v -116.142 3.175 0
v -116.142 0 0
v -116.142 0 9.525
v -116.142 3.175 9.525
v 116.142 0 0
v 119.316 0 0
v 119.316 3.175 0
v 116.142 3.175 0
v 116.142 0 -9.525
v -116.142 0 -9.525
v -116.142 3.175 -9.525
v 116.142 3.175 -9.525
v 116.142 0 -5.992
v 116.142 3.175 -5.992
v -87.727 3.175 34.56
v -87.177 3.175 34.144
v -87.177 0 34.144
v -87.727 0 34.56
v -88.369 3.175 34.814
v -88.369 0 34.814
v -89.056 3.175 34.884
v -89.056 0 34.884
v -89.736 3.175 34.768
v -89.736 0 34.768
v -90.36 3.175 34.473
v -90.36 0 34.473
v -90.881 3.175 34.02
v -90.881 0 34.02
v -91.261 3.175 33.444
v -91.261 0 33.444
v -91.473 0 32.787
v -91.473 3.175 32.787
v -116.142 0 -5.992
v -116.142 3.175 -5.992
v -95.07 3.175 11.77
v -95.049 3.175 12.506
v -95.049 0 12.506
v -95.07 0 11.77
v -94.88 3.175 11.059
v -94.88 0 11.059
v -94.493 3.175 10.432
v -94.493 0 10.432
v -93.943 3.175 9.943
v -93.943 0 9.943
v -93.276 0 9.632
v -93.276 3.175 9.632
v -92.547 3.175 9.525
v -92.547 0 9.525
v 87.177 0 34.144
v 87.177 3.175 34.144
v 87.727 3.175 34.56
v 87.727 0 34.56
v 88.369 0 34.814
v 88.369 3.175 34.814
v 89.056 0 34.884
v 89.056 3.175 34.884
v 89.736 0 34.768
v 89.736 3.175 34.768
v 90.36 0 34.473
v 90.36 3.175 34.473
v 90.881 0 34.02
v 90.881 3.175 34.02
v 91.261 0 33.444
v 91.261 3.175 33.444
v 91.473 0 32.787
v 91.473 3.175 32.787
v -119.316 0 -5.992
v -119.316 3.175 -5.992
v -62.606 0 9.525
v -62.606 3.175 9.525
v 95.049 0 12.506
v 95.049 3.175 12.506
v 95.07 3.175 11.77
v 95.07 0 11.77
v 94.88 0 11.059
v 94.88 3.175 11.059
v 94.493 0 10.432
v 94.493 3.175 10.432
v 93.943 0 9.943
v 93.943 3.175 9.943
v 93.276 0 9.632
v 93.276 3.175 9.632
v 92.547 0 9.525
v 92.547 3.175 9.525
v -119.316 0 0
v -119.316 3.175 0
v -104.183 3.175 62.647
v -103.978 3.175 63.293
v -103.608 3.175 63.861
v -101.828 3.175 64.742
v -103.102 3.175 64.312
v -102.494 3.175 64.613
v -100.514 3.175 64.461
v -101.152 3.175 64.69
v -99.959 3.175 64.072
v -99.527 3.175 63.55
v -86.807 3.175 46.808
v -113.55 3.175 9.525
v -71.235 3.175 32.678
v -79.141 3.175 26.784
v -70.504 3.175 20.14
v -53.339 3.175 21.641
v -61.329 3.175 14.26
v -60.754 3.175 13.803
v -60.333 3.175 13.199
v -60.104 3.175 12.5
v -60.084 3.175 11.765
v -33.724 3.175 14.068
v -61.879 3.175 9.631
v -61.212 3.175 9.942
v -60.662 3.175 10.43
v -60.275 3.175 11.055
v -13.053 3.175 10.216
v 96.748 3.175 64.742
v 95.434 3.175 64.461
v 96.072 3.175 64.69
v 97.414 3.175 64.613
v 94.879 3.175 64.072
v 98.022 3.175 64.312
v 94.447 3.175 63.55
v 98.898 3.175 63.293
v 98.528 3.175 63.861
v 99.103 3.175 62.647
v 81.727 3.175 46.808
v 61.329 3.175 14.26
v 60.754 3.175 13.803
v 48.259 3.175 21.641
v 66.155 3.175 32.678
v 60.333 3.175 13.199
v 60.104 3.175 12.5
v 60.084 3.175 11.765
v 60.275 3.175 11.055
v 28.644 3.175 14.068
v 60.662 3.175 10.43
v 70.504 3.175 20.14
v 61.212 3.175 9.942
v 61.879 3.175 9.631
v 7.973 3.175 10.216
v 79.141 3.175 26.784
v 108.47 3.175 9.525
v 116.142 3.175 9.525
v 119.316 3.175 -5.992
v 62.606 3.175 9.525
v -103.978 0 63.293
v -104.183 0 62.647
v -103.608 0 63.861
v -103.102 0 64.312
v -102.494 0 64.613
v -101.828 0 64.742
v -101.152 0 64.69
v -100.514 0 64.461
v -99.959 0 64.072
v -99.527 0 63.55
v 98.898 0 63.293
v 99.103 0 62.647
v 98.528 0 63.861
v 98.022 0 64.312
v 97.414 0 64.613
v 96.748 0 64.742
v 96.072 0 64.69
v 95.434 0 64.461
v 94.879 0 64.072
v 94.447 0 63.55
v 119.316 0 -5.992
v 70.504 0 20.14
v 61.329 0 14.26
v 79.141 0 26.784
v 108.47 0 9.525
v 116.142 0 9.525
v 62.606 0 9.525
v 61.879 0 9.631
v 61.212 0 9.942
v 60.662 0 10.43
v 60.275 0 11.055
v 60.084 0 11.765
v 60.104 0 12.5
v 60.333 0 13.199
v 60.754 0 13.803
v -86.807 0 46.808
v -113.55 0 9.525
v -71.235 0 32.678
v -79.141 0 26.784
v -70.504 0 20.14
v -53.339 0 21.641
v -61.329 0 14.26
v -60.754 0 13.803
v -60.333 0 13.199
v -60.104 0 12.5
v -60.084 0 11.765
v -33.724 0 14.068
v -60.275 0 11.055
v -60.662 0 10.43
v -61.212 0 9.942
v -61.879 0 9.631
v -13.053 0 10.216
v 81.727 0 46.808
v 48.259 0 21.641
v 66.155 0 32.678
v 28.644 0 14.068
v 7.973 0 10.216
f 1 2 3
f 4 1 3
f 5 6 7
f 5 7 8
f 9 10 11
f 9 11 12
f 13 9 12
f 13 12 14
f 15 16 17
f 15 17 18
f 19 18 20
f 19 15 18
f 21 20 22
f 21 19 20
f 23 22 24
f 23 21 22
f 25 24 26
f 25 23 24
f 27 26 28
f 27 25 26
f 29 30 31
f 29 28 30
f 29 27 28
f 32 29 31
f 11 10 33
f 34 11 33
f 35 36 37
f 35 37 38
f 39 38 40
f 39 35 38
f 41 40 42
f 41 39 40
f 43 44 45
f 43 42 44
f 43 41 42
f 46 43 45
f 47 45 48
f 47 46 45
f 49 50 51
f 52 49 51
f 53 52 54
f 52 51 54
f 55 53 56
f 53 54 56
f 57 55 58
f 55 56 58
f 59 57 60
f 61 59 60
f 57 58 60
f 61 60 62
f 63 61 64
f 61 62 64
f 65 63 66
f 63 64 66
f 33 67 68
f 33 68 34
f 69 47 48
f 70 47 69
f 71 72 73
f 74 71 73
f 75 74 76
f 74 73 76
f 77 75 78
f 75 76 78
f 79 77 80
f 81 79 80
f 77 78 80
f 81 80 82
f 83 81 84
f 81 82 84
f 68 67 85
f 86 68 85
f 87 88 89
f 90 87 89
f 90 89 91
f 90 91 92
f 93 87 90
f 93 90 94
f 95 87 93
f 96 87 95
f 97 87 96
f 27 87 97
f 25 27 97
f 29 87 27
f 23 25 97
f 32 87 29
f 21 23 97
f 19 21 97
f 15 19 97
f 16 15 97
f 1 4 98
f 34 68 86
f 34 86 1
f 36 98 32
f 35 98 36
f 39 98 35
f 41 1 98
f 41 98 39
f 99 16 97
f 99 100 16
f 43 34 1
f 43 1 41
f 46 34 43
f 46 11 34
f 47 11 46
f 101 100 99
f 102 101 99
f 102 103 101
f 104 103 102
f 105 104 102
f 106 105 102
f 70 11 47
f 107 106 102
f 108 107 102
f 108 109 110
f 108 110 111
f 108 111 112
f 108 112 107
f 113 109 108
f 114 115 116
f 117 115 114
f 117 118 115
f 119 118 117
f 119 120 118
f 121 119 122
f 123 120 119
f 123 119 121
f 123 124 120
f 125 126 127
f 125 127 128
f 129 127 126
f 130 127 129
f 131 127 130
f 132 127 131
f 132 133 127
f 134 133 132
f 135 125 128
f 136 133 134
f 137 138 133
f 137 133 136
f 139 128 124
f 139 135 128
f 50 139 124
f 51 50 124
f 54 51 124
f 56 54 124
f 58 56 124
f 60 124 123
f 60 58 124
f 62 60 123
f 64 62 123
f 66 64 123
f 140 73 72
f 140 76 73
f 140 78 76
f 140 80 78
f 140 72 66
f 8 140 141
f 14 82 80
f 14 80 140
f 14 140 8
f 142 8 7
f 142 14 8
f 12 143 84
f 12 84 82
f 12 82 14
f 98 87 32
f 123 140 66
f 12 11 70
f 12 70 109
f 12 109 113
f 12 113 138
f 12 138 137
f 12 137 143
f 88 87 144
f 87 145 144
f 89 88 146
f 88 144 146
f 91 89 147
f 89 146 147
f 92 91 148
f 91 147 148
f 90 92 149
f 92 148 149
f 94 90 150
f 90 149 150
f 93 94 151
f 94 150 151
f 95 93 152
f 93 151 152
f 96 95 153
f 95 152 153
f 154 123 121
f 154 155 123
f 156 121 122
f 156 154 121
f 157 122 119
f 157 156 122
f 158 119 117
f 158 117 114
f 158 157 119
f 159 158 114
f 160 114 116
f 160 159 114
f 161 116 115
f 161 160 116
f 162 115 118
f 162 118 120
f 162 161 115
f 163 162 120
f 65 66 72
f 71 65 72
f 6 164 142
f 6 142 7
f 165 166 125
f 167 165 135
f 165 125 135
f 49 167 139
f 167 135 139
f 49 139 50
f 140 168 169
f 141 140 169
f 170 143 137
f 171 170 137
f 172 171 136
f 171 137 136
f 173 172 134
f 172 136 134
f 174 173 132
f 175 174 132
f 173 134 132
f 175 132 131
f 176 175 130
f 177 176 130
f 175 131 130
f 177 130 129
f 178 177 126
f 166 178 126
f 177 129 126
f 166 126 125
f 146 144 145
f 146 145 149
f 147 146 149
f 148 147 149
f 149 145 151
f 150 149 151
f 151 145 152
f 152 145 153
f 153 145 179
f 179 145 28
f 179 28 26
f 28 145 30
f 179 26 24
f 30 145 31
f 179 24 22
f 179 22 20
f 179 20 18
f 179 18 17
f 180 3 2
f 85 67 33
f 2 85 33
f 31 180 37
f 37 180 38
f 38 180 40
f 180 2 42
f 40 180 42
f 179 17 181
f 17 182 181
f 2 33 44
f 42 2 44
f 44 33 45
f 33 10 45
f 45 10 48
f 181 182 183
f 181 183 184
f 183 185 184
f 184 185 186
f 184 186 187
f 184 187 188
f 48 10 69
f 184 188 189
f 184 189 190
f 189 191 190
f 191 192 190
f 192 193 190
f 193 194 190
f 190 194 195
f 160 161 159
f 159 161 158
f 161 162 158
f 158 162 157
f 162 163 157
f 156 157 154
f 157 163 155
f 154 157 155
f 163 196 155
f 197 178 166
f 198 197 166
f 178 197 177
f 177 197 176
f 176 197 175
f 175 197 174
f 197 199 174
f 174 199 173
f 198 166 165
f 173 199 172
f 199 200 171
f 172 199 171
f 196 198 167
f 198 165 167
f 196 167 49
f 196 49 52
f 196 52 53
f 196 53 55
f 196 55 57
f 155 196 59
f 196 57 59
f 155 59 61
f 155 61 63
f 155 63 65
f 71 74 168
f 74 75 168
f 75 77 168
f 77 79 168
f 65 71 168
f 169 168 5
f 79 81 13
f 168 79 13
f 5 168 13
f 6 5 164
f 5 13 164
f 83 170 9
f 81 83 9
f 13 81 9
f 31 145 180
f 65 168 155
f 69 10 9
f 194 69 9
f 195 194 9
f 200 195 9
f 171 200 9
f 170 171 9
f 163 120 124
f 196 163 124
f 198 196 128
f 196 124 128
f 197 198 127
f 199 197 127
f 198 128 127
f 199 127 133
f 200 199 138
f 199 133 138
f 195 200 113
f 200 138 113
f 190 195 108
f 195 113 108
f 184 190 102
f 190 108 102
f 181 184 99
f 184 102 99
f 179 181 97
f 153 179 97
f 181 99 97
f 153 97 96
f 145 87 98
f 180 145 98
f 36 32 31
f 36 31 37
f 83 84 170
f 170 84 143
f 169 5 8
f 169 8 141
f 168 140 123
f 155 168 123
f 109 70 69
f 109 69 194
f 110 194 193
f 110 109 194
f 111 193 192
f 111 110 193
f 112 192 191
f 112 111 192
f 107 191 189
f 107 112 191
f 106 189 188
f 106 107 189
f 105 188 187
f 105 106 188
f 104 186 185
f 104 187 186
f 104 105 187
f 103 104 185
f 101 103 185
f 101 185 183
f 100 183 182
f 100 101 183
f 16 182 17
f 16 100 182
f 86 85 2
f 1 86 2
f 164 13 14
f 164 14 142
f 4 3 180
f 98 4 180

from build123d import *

# Parameters (mm, degrees)
SKETCH1_W               = 666.75
SKETCH1_H               = 19.05
BOSS_EXTRUDE1_DEPTH     = 3.175
SKETCH2_W               = 3.175
SKETCH2_H               = 9.525
CUT_EXTRUDE2_DEPTH      = 334.526156208
TOP_BALL_SECURING_DEPTH = 3.175
FILLET2_R               = 2.54
CUT_EXTRUDE3_DEPTH      = 340.618903378
CUT_EXTRUDE8_REACH      = 341.619
SKETCH12_W              = 214.0585
SKETCH12_H              = 19.05
CUT_EXTRUDE9_REACH      = 137.789
SKETCH13_W              = 3.175
SKETCH13_H              = 3.53251897


with BuildPart() as part:
    # Sketch1 → Boss-Extrude1 (new body)
    with BuildSketch(Plane(origin=(0, 0, 0), x_dir=(1, 0, 0), z_dir=(0, 1, 0))):
        Rectangle(SKETCH1_W, SKETCH1_H)
    extrude(amount=BOSS_EXTRUDE1_DEPTH)

    # Sketch2 → Cut-Extrude2 (cut, through all)
    with BuildSketch(Plane.XZ):
        with Locations((-331.7875, 4.7625)):
            Rectangle(SKETCH2_W, SKETCH2_H)
        with Locations((-117.729, 4.7625)):
            Rectangle(SKETCH2_W, SKETCH2_H)
    cut_extrude2 = extrude(amount=-CUT_EXTRUDE2_DEPTH, mode=Mode.SUBTRACT)

    # Mirror1: Cut-Extrude2 across plane
    add(cut_extrude2.mirror(Plane(origin=(0, 0, 0), x_dir=(0, 0, 1), z_dir=(1, 0, 0))), mode=Mode.SUBTRACT)

    # Sketch3 → top ball securing (add)
    with BuildSketch(Plane(origin=(0, 3.175, 0), x_dir=(1, 0, 0), z_dir=(0, 1, 0))):
        with BuildLine():
            Line((108.470225533, -9.525), (97.899375359, -69.475270408))
            ThreePointArc((97.899375359, -69.475270408), (-2.54, -9.731863753), (-102.979375359, -69.475270408))
            Line((-102.979375359, -69.475270408), (-113.550225533, -9.525))
            Line((-113.550225533, -9.525), (108.470225533, -9.525))
        make_face()
    extrude(amount=-TOP_BALL_SECURING_DEPTH)

    # Fillet2
    fillet2_edges = [part.edges().sort_by_distance(p)[0] for p in [
        (-102.979375359, 1.5875, 69.475270408),
        (97.899375359, 1.5875, 69.475270408),
    ]]
    fillet(fillet2_edges, radius=FILLET2_R)

    # Sketch5 → Cut-Extrude3 (cut, through all)
    with BuildSketch(Plane(origin=(0, 3.175, 0), x_dir=(1, 0, 0), z_dir=(0, 1, 0))):
        with BuildLine():
            Line((-91.472594393, -32.786971326), (-95.048665129, -12.506066371))
            ThreePointArc((-95.048665129, -12.506066371), (-94.493006322, -10.432319471), (-92.547253437, -9.525))
            Line((-92.547253437, -9.525), (-62.60624334, -9.525))
            ThreePointArc((-62.60624334, -9.525), (-60.153898656, -11.403482389), (-61.32886602, -14.260428701))
            ThreePointArc((-61.32886602, -14.260428701), (-74.893704079, -23.368953639), (-87.176845785, -34.143668852))
            ThreePointArc((-87.176845785, -34.143668852), (-89.736130888, -34.767981392), (-91.472594393, -32.786971326))
        make_face()
        with BuildLine():
            Line((92.547253437, -9.525), (62.60624334, -9.525))
            ThreePointArc((62.60624334, -9.525), (60.153898656, -11.403482389), (61.32886602, -14.260428701))
            ThreePointArc((61.32886602, -14.260428701), (74.893704079, -23.368953639), (87.176845785, -34.143668852))
            ThreePointArc((87.176845785, -34.143668852), (89.736130888, -34.767981392), (91.472594393, -32.786971326))
            Line((91.472594393, -32.786971326), (95.048665129, -12.506066371))
            ThreePointArc((95.048665129, -12.506066371), (94.493006322, -10.432319471), (92.547253437, -9.525))
        make_face()
    extrude(amount=-CUT_EXTRUDE3_DEPTH, mode=Mode.SUBTRACT)

    # Sketch12 → Cut-Extrude8 (cut, up to next)
    with BuildSketch(Plane.XZ, mode=Mode.PRIVATE) as cut_extrude8_sk1:
        with Locations((226.34575, 0)):
            Rectangle(SKETCH12_W, SKETCH12_H)
    cut_extrude8_tool1 = extrude(cut_extrude8_sk1.sketch, amount=-CUT_EXTRUDE8_REACH, mode=Mode.PRIVATE) & part.part
    # Sketch12 → Cut-Extrude8 (cut, up to next)
    with BuildSketch(Plane.XZ, mode=Mode.PRIVATE) as cut_extrude8_sk2:
        with Locations((-226.34575, 0)):
            Rectangle(SKETCH12_W, SKETCH12_H)
    cut_extrude8_tool2 = extrude(cut_extrude8_sk2.sketch, amount=-CUT_EXTRUDE8_REACH, mode=Mode.PRIVATE) & part.part
    add(cut_extrude8_tool1.solids().sort_by_distance((226.34575, 0, 0))[0], mode=Mode.SUBTRACT)
    add(cut_extrude8_tool2.solids().sort_by_distance((-226.34575, 0, 0))[0], mode=Mode.SUBTRACT)

    # Sketch13 → Cut-Extrude9 (cut, up to next)
    with BuildSketch(Plane.XZ, mode=Mode.PRIVATE) as cut_extrude9_sk1:
        with Locations((117.729, -7.758740515)):
            Rectangle(SKETCH13_W, SKETCH13_H)
    cut_extrude9_tool1 = extrude(cut_extrude9_sk1.sketch, amount=-CUT_EXTRUDE9_REACH, mode=Mode.PRIVATE) & part.part
    # Sketch13 → Cut-Extrude9 (cut, up to next)
    with BuildSketch(Plane.XZ, mode=Mode.PRIVATE) as cut_extrude9_sk2:
        with Locations((-117.729, -7.758740515)):
            Rectangle(SKETCH13_W, SKETCH13_H)
    cut_extrude9_tool2 = extrude(cut_extrude9_sk2.sketch, amount=-CUT_EXTRUDE9_REACH, mode=Mode.PRIVATE) & part.part
    add(cut_extrude9_tool1.solids().sort_by_distance((117.729, 0, -7.758741))[0], mode=Mode.SUBTRACT)
    add(cut_extrude9_tool2.solids().sort_by_distance((-117.729, 0, -7.758741))[0], mode=Mode.SUBTRACT)


solid = part.part
